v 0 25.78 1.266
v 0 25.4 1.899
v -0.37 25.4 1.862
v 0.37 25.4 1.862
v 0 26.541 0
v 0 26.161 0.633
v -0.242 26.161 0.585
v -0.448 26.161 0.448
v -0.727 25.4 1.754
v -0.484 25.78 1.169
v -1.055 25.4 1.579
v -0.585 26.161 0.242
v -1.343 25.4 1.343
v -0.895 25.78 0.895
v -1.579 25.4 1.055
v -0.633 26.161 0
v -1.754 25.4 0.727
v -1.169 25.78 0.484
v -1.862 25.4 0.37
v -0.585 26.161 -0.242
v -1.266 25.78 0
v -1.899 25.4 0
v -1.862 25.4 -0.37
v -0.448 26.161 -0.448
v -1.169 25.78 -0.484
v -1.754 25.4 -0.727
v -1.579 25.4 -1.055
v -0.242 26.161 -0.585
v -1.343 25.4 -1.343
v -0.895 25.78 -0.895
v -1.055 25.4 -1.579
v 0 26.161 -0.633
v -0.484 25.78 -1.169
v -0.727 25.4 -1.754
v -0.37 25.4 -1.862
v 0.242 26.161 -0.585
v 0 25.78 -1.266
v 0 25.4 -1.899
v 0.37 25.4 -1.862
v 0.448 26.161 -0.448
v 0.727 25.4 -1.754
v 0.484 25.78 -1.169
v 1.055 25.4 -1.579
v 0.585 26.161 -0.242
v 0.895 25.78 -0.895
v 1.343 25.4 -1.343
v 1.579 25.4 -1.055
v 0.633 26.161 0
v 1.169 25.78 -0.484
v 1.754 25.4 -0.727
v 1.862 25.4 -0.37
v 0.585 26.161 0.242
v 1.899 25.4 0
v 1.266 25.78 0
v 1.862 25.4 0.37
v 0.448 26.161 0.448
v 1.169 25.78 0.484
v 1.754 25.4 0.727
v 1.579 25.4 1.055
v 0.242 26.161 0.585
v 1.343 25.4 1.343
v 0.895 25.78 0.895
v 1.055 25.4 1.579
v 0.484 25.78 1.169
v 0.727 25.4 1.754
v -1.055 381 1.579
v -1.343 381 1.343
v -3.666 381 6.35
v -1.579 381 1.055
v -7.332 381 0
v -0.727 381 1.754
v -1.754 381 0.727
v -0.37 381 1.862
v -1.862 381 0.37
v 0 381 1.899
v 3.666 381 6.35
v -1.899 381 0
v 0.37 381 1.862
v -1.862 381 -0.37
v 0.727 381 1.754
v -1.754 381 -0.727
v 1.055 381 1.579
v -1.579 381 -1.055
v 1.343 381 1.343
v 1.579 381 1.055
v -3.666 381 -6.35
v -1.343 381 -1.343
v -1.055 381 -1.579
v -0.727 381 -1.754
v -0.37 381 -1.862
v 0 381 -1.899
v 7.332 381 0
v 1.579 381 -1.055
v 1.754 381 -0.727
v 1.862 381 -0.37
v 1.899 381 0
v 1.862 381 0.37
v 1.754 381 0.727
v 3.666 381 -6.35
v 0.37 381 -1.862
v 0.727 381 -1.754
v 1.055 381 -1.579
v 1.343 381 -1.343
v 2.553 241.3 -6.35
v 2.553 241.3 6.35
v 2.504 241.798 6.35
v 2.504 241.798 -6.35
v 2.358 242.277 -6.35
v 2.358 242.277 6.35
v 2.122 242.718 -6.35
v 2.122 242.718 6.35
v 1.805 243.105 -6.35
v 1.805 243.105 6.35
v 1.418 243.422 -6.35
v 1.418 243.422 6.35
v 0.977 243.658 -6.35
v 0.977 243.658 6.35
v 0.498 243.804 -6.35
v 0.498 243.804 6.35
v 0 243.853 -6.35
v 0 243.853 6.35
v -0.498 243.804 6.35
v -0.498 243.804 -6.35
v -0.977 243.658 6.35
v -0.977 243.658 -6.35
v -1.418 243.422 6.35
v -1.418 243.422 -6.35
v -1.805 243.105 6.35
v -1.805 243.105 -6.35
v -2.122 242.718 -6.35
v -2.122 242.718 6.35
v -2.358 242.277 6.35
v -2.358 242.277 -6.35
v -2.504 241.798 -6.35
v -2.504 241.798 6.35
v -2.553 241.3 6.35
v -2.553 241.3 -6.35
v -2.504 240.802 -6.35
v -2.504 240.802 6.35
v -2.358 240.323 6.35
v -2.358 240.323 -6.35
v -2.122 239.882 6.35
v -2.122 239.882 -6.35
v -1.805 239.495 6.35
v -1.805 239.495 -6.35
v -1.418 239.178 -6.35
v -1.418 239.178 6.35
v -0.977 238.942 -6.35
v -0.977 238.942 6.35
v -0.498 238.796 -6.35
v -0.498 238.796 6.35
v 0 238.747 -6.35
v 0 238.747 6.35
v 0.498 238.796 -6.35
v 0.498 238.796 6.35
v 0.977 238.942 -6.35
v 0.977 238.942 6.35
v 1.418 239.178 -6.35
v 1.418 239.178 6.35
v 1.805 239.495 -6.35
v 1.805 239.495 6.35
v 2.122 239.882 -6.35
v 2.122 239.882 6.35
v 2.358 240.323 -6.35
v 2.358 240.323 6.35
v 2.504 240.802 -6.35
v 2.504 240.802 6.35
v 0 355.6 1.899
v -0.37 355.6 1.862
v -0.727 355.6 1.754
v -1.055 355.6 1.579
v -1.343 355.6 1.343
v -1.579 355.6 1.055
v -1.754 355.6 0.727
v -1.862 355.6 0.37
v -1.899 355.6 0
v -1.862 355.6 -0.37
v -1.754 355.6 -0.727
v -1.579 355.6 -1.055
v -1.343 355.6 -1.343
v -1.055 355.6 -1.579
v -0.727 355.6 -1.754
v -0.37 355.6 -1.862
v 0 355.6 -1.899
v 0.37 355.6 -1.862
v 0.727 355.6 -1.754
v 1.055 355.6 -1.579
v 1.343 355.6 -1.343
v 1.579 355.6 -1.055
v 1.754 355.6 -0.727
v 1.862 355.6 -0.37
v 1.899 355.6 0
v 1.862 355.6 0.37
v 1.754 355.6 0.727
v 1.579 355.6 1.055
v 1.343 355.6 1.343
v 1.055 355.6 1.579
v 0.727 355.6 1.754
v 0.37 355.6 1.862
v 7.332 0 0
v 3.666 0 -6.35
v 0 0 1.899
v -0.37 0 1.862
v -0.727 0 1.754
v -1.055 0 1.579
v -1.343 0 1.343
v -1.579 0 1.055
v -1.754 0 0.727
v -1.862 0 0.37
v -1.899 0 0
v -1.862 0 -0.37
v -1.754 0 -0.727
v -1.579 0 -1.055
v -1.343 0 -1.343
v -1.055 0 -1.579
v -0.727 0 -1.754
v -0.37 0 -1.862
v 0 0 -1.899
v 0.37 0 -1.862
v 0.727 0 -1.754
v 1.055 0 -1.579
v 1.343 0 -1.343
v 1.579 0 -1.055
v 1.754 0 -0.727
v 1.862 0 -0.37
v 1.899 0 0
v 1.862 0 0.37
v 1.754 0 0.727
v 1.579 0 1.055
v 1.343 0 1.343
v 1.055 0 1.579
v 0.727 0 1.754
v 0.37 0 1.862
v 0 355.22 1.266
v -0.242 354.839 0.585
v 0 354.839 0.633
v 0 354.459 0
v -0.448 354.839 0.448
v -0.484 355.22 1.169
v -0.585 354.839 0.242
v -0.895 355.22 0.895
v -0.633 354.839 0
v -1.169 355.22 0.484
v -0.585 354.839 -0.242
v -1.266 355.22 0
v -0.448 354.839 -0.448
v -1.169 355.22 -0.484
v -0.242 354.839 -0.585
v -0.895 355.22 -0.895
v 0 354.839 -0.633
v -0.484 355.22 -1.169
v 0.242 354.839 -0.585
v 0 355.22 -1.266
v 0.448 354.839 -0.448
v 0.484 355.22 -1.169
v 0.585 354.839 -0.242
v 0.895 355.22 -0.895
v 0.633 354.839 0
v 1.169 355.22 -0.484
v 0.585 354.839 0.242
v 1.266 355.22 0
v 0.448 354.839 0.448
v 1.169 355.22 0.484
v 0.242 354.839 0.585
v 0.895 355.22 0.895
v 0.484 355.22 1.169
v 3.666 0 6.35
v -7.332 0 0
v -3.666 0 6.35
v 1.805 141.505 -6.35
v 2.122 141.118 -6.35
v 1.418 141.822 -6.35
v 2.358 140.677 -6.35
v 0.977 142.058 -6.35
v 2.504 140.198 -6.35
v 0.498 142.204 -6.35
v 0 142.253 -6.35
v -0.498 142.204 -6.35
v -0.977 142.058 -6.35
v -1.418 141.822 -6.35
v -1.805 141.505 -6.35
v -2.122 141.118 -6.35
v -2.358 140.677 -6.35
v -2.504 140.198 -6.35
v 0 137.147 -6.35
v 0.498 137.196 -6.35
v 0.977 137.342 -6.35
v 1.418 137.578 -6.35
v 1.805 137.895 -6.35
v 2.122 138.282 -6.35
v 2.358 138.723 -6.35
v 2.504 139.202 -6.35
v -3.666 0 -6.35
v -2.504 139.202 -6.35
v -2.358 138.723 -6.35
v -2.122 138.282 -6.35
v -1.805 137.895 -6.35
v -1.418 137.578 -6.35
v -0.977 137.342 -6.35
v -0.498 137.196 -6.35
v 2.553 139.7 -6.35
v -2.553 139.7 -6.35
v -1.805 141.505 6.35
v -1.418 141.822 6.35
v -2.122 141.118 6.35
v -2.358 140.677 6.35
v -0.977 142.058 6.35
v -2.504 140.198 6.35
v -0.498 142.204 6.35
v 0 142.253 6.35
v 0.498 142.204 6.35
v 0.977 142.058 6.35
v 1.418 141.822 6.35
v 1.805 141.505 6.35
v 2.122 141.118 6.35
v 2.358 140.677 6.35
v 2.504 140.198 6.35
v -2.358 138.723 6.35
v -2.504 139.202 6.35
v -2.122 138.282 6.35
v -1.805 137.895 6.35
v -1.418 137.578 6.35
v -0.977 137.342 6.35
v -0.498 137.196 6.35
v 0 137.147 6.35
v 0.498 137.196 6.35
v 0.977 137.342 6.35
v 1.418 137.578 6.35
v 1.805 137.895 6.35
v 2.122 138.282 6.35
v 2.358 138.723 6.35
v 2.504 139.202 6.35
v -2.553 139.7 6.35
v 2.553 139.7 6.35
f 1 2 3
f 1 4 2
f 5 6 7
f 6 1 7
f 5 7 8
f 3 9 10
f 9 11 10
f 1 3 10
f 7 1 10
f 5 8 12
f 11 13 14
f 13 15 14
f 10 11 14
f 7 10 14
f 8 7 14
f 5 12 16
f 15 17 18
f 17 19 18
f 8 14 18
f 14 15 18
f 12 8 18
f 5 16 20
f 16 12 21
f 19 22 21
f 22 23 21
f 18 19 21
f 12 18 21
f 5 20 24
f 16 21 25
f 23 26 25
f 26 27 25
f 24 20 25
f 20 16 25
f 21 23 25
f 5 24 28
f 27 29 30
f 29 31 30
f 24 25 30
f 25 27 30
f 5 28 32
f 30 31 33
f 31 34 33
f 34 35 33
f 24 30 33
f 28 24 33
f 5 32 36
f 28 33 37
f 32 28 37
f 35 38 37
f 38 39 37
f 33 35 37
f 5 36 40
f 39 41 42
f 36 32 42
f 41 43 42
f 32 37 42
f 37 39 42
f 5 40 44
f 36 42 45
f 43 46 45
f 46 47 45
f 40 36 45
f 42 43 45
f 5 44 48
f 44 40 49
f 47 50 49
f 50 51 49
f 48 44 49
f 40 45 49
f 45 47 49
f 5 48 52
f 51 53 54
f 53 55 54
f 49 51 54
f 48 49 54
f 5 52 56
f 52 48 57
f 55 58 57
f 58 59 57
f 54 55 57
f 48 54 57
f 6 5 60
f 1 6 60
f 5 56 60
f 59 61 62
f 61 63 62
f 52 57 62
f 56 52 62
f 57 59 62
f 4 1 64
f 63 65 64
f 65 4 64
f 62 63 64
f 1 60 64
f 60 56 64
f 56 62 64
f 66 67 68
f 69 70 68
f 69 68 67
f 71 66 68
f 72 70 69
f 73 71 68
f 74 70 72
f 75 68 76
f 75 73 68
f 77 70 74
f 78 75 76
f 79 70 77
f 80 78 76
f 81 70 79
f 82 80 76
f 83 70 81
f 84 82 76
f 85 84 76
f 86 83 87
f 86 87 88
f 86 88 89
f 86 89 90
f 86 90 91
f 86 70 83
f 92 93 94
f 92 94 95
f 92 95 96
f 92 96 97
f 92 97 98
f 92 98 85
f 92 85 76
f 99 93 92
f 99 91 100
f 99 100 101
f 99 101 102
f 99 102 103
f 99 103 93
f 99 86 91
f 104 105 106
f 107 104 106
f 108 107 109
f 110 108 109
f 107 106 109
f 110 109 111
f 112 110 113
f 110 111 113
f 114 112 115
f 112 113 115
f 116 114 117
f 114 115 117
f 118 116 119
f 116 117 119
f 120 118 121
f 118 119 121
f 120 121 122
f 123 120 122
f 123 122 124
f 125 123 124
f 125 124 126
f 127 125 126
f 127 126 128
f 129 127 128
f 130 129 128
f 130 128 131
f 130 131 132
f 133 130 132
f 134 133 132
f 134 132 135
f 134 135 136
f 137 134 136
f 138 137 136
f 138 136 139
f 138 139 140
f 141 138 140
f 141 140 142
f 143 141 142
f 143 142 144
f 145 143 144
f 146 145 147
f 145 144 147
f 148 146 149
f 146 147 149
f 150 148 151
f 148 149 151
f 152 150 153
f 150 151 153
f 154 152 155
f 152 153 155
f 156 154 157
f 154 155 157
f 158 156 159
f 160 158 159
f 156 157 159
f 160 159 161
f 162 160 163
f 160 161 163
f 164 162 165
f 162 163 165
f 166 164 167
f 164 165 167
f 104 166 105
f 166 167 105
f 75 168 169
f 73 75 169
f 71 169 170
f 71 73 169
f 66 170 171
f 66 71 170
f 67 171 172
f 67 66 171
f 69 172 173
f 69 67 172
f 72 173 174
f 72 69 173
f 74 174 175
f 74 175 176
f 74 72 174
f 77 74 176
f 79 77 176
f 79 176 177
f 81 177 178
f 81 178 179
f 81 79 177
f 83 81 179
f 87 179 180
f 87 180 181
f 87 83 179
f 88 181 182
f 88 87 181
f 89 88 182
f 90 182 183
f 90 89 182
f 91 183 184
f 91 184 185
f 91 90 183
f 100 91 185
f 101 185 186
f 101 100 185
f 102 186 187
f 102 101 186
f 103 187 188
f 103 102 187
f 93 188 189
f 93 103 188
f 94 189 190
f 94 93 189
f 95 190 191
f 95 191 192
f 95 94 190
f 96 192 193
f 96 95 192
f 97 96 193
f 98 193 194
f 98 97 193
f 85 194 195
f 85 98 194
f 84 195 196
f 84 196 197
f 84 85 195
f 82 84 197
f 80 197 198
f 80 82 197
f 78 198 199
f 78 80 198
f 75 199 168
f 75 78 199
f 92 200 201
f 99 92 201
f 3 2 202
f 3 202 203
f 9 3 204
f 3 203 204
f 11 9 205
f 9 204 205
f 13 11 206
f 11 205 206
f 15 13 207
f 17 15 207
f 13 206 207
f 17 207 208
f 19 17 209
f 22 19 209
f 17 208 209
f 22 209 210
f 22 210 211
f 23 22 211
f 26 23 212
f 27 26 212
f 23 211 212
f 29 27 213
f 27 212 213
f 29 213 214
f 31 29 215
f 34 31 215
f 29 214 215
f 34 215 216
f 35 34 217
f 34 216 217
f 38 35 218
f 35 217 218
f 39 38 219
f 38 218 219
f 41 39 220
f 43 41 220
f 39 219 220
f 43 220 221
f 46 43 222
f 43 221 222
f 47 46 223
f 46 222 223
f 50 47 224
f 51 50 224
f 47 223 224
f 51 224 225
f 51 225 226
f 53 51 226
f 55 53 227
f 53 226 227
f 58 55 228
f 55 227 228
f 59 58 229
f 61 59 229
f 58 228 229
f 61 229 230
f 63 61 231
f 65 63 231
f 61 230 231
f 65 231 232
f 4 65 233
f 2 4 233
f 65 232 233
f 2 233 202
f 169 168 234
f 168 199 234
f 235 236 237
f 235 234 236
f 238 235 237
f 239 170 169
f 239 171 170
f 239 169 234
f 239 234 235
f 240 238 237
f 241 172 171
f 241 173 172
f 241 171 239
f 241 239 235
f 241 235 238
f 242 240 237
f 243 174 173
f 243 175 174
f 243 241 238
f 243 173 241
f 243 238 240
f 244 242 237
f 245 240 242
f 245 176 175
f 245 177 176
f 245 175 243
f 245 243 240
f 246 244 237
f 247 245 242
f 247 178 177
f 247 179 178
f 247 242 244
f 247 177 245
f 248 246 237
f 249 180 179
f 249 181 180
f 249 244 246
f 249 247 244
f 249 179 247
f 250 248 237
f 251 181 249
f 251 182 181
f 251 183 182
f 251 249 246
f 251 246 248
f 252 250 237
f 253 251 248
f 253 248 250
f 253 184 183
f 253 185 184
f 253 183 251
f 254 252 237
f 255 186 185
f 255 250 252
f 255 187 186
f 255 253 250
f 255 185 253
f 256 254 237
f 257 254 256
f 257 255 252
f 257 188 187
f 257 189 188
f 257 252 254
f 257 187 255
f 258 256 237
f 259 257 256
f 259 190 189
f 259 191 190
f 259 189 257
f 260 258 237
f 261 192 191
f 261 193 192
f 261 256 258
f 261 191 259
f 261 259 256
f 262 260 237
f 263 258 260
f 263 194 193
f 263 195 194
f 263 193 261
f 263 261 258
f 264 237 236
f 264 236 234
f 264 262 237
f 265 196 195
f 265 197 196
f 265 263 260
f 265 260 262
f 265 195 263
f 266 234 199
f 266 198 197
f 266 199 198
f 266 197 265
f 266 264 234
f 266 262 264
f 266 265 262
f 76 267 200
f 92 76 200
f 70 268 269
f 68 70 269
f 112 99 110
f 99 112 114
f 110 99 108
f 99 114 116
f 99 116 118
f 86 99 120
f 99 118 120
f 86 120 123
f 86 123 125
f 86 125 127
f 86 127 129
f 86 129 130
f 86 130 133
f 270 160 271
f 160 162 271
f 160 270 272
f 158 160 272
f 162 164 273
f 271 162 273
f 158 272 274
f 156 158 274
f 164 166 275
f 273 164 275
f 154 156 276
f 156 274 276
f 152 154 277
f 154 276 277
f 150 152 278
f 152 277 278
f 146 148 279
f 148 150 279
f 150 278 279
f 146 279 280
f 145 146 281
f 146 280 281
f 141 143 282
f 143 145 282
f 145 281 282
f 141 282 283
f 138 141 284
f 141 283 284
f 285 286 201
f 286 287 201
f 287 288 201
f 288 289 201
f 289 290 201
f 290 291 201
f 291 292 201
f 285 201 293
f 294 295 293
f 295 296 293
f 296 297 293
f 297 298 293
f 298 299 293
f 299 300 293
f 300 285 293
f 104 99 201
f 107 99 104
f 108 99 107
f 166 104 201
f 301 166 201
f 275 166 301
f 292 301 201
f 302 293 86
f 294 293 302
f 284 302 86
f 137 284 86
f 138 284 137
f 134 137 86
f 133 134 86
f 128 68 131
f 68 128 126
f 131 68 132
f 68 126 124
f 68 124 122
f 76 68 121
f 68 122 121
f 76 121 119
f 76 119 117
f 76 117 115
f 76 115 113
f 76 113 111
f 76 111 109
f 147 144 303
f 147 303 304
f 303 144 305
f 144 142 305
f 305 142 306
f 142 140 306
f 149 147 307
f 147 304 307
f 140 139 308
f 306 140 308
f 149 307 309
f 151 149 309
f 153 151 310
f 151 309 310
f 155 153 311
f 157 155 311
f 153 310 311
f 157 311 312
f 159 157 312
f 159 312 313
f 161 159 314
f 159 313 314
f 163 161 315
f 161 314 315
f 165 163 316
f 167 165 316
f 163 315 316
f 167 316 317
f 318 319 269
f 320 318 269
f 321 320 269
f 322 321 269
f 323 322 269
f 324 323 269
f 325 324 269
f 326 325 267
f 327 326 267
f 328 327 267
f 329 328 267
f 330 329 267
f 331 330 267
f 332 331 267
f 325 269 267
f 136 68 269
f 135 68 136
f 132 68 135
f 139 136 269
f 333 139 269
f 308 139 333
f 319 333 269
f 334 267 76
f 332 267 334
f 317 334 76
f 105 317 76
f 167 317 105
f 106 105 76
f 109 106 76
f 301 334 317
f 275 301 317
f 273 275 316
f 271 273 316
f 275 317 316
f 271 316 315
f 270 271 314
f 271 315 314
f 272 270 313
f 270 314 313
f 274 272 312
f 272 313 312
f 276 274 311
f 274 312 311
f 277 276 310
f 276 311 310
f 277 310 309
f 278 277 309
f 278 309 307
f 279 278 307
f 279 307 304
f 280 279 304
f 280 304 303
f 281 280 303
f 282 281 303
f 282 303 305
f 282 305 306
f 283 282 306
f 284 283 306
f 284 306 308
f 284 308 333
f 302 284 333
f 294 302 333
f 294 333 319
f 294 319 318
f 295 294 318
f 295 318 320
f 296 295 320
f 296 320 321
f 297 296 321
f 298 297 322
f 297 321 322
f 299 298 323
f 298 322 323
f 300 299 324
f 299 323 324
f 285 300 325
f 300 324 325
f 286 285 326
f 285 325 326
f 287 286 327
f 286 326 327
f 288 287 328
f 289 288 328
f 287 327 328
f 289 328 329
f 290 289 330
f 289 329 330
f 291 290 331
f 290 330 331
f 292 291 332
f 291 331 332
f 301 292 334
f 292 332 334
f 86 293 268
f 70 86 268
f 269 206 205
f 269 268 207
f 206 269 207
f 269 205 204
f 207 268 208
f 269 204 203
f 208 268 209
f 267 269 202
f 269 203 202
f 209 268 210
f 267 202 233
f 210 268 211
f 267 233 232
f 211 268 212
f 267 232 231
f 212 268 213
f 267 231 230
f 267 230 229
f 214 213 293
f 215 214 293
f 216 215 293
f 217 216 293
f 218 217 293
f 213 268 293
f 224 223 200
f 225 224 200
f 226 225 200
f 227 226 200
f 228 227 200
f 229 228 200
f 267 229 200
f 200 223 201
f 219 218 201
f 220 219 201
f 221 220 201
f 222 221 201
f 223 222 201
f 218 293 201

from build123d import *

# Parameters (mm, degrees)
BOSS_EXTRUDE1_DEPTH    = 381
F_10_CLEARANCE_HOLE1_D = 5.1054


with BuildPart() as part:
    # Sketch1 → Boss-Extrude1 (new body)
    with BuildSketch(Plane(origin=(0, 0, 0), x_dir=(1, 0, 0), z_dir=(0, 1, 0))):
        Polygon((7.332348419, 0), (3.666174209, 6.35), (-3.666174209, 6.35), (-7.332348419, 0), (-3.666174209, -6.35), (3.666174209, -6.35), align=None)
    extrude(amount=BOSS_EXTRUDE1_DEPTH)

    # Sketch2 → Tap Drill for #10-24 Tap1 (revolve, cut)
    with BuildSketch(Plane(origin=(0, 381, 0), x_dir=(0, 0, 1), z_dir=(1, 0, 0))):
        Polygon((0, 0), (0, 26.540824014), (1.89865, 25.4), (1.89865, 0), align=None)
    tap_drill_for_10_24_tap1 = revolve(axis=Axis((0, 387.35, 0), (0, -1, 0)), mode=Mode.SUBTRACT)

    # Mirror1: Tap Drill for #10-24 Tap1 across plane
    add(tap_drill_for_10_24_tap1.mirror(Plane.ZX.offset(190.5)), mode=Mode.SUBTRACT)

    # #10 Clearance Hole1 (through all)
    with Locations(Plane(origin=(0, 0, -6.35), x_dir=(-1, 0, 0), z_dir=(0, 0, -1))):
        with Locations((0, 139.7), (0, 241.3)):
            Hole(F_10_CLEARANCE_HOLE1_D / 2)


solid = part.part
